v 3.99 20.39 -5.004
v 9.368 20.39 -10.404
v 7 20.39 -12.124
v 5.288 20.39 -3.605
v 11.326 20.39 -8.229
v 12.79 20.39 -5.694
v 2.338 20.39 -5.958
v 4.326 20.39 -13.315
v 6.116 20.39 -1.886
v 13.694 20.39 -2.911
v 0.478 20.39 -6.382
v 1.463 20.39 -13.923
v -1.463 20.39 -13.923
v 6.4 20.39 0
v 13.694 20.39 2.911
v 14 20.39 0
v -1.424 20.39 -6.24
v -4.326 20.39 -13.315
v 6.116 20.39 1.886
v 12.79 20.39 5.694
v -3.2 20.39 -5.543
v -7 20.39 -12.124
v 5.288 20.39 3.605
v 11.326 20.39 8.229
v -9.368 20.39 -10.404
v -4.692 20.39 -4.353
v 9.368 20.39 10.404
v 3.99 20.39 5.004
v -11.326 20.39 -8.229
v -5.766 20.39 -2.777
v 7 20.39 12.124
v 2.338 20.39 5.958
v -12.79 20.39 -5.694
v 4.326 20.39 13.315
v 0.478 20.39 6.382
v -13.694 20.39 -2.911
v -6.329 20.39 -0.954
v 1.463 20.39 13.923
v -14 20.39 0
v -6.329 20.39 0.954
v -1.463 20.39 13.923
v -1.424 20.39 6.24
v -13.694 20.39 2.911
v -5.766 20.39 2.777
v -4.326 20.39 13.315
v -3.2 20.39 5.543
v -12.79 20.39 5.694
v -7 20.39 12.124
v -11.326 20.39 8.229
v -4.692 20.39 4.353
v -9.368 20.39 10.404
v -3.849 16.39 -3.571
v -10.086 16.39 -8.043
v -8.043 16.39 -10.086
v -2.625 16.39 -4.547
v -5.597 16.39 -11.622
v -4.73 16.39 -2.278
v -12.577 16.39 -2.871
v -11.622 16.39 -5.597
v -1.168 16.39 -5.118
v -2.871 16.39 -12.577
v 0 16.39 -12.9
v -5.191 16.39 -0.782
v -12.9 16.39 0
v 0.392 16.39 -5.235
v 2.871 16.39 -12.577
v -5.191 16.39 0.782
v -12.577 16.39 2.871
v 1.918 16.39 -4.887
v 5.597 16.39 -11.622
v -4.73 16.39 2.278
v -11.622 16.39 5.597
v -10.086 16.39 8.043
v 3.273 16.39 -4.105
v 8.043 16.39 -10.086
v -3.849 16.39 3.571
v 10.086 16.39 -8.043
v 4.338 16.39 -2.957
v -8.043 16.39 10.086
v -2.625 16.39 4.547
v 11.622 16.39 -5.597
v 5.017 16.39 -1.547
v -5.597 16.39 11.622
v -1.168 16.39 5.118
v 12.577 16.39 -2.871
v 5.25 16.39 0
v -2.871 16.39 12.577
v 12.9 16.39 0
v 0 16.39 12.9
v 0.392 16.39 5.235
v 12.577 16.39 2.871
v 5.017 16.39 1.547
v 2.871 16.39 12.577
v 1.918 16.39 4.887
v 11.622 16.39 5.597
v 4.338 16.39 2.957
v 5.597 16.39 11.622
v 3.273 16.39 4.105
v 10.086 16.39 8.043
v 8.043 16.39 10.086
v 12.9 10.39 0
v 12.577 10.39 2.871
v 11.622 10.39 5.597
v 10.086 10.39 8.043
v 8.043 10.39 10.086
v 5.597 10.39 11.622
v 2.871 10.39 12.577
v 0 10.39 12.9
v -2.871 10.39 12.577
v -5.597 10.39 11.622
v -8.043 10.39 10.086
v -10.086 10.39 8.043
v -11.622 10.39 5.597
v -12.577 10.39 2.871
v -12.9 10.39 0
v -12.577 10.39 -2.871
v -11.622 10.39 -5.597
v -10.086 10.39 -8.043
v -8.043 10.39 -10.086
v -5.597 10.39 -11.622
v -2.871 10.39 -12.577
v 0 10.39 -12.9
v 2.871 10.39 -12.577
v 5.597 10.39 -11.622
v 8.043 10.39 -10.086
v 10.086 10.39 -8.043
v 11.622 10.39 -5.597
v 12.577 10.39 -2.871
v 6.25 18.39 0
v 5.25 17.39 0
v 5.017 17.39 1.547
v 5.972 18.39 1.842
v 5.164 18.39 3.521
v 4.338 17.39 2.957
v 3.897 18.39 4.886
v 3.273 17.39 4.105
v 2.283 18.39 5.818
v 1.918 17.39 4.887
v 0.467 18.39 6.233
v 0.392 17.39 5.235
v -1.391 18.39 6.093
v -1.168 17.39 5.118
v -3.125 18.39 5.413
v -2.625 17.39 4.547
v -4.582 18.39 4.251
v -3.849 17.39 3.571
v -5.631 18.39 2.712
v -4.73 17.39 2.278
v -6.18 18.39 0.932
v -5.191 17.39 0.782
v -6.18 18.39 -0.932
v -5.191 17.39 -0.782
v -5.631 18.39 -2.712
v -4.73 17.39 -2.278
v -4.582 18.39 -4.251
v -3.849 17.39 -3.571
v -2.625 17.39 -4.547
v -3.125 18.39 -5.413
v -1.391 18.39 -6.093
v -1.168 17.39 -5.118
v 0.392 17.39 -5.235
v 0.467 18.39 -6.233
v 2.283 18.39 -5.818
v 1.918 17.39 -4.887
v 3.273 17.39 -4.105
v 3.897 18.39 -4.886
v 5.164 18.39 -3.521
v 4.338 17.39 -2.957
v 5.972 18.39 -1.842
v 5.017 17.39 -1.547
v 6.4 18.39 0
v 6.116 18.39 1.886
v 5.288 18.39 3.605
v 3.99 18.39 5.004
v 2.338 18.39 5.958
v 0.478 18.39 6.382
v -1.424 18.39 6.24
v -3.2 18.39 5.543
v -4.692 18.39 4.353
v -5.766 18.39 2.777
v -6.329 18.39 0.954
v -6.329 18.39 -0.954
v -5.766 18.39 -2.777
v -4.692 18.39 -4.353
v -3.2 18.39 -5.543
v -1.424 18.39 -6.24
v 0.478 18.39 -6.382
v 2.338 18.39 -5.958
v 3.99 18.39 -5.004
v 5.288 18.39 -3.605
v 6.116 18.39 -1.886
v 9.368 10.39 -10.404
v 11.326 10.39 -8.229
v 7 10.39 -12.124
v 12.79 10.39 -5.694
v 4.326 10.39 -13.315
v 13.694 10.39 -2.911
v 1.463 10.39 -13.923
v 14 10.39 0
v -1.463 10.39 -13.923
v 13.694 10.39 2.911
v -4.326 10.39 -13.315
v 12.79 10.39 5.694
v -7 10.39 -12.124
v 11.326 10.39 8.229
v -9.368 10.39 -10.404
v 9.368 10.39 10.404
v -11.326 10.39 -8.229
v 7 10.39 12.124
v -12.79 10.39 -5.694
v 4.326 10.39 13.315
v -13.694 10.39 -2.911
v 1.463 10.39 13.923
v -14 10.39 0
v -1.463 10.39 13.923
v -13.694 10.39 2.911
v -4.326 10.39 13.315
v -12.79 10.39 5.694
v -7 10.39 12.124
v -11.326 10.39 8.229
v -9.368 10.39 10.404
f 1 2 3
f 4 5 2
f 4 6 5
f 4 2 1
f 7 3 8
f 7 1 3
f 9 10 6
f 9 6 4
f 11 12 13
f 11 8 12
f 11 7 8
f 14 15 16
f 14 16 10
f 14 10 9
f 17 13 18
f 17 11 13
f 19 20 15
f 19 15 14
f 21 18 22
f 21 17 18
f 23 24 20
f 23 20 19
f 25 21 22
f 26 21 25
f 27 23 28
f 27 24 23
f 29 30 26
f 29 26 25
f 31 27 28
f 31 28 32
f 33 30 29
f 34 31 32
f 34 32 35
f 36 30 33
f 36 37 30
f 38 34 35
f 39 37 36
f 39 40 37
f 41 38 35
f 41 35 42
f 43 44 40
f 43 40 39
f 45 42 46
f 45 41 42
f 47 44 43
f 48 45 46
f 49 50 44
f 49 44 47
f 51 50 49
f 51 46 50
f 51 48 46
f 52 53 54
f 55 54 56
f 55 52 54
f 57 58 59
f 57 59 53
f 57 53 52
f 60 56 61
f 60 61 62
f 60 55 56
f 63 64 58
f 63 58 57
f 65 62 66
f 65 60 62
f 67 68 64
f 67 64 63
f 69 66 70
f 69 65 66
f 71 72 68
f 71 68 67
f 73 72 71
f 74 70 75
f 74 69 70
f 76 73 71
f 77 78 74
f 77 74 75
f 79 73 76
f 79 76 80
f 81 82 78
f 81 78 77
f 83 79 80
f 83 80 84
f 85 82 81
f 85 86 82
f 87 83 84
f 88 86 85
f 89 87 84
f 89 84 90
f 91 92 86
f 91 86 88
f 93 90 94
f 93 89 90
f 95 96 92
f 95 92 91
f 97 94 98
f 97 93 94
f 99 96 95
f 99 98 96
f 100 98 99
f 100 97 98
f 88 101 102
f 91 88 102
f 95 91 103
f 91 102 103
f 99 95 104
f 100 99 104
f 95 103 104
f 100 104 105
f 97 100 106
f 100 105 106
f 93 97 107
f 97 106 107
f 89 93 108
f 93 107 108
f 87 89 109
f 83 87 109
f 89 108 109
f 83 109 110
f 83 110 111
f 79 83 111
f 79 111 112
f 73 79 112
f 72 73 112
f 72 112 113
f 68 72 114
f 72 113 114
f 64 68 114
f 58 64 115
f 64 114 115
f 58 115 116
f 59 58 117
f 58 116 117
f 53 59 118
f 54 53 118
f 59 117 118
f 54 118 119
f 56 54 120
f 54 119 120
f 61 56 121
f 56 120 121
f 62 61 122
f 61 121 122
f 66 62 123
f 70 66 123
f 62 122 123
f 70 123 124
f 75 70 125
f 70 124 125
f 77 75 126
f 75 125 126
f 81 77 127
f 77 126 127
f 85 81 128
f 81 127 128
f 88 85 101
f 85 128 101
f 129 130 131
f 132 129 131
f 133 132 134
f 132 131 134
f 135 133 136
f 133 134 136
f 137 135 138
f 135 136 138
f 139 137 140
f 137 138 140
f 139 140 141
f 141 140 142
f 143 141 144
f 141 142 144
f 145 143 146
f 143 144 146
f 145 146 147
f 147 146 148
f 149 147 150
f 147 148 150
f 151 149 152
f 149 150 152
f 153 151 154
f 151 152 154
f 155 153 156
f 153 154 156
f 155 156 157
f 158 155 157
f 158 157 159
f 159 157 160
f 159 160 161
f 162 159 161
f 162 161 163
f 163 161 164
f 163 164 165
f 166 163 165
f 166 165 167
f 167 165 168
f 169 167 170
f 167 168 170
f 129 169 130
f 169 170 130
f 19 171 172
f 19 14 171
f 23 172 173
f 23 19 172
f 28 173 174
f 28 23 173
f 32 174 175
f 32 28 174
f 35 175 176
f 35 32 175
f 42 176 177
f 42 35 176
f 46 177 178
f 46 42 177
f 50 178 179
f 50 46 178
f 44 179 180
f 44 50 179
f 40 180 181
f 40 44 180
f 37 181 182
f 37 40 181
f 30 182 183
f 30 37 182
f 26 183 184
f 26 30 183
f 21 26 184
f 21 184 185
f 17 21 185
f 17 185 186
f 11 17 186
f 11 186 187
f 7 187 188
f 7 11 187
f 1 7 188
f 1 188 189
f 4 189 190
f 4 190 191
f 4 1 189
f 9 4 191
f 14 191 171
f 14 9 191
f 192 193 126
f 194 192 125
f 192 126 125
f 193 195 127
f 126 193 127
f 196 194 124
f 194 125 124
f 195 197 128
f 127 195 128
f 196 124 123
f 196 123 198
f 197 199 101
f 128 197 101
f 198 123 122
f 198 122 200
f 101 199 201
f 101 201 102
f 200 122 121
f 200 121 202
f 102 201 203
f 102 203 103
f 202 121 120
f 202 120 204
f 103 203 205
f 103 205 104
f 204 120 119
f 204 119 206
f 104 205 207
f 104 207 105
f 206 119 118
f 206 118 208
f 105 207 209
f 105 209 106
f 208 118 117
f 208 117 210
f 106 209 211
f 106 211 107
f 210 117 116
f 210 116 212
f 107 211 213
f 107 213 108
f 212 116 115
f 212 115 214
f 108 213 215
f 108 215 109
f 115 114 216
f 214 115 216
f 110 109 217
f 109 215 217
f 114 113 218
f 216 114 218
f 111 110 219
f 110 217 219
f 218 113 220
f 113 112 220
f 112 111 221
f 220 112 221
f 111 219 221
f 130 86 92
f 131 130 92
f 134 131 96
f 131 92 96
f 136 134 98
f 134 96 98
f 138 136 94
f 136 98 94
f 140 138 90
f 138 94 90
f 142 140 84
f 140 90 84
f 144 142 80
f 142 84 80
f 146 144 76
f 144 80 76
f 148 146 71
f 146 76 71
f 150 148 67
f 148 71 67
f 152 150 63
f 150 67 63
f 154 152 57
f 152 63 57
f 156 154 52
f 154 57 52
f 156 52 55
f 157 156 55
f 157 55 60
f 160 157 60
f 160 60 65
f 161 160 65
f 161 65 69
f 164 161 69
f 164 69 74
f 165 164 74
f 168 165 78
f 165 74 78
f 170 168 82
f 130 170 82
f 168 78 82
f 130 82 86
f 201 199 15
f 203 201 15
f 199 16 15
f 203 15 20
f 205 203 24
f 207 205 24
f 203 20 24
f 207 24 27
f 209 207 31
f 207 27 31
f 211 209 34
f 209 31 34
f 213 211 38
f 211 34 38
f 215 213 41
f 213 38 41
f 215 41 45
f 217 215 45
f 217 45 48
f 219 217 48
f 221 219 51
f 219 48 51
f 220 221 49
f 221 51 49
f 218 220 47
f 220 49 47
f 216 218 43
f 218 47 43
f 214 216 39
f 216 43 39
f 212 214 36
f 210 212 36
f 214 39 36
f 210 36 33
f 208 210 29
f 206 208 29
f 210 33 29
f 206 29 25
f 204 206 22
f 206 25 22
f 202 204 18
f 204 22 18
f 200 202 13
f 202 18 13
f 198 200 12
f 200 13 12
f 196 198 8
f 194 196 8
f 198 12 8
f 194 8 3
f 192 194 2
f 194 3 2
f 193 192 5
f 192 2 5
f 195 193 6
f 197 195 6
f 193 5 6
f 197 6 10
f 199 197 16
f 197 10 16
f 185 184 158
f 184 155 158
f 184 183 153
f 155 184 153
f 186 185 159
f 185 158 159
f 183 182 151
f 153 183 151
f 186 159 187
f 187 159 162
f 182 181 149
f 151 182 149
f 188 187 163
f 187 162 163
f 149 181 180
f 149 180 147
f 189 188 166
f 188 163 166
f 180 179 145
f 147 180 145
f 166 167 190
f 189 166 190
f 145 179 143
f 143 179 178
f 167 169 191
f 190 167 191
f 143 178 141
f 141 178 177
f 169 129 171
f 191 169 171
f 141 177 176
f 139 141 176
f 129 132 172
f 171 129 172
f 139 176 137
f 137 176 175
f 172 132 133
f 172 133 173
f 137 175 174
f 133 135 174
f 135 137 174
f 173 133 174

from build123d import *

# Parameters (mm, degrees)
F1_W     = 7.6
F1_H     = 2
F3_R     = 12.9
F3_R_2   = 5.25
F4_DEPTH = 6
F5_SIZE  = 1


with BuildPart() as f2:
    # F1 (on Top) → F2 (revolve)
    with BuildSketch(Plane.XY):
        with Locations((10.2, 19.389948)):
            Rectangle(F1_W, F1_H)
        Polygon((5.25, 18.389948), (5.25, 10.389948), (14, 10.389948), (14, 18.389948), (6.4, 18.389948), align=None)
    revolve(axis=Axis((0, 1.251986, 0), (0, -1, 0)))

    # F3 (on face) → F4 (cut)
    with BuildSketch(Plane.XZ.offset(-10.389948)):
        Circle(F3_R)
        Circle(F3_R_2, mode=Mode.SUBTRACT)
    extrude(amount=-F4_DEPTH, mode=Mode.SUBTRACT)

    # F5
    f5_edges = [f2.edges().sort_by_distance(p)[0] for p in [
        (-5.25, 18.389948, 0),
    ]]
    chamfer(f5_edges, length=F5_SIZE)


solid = f2.part
